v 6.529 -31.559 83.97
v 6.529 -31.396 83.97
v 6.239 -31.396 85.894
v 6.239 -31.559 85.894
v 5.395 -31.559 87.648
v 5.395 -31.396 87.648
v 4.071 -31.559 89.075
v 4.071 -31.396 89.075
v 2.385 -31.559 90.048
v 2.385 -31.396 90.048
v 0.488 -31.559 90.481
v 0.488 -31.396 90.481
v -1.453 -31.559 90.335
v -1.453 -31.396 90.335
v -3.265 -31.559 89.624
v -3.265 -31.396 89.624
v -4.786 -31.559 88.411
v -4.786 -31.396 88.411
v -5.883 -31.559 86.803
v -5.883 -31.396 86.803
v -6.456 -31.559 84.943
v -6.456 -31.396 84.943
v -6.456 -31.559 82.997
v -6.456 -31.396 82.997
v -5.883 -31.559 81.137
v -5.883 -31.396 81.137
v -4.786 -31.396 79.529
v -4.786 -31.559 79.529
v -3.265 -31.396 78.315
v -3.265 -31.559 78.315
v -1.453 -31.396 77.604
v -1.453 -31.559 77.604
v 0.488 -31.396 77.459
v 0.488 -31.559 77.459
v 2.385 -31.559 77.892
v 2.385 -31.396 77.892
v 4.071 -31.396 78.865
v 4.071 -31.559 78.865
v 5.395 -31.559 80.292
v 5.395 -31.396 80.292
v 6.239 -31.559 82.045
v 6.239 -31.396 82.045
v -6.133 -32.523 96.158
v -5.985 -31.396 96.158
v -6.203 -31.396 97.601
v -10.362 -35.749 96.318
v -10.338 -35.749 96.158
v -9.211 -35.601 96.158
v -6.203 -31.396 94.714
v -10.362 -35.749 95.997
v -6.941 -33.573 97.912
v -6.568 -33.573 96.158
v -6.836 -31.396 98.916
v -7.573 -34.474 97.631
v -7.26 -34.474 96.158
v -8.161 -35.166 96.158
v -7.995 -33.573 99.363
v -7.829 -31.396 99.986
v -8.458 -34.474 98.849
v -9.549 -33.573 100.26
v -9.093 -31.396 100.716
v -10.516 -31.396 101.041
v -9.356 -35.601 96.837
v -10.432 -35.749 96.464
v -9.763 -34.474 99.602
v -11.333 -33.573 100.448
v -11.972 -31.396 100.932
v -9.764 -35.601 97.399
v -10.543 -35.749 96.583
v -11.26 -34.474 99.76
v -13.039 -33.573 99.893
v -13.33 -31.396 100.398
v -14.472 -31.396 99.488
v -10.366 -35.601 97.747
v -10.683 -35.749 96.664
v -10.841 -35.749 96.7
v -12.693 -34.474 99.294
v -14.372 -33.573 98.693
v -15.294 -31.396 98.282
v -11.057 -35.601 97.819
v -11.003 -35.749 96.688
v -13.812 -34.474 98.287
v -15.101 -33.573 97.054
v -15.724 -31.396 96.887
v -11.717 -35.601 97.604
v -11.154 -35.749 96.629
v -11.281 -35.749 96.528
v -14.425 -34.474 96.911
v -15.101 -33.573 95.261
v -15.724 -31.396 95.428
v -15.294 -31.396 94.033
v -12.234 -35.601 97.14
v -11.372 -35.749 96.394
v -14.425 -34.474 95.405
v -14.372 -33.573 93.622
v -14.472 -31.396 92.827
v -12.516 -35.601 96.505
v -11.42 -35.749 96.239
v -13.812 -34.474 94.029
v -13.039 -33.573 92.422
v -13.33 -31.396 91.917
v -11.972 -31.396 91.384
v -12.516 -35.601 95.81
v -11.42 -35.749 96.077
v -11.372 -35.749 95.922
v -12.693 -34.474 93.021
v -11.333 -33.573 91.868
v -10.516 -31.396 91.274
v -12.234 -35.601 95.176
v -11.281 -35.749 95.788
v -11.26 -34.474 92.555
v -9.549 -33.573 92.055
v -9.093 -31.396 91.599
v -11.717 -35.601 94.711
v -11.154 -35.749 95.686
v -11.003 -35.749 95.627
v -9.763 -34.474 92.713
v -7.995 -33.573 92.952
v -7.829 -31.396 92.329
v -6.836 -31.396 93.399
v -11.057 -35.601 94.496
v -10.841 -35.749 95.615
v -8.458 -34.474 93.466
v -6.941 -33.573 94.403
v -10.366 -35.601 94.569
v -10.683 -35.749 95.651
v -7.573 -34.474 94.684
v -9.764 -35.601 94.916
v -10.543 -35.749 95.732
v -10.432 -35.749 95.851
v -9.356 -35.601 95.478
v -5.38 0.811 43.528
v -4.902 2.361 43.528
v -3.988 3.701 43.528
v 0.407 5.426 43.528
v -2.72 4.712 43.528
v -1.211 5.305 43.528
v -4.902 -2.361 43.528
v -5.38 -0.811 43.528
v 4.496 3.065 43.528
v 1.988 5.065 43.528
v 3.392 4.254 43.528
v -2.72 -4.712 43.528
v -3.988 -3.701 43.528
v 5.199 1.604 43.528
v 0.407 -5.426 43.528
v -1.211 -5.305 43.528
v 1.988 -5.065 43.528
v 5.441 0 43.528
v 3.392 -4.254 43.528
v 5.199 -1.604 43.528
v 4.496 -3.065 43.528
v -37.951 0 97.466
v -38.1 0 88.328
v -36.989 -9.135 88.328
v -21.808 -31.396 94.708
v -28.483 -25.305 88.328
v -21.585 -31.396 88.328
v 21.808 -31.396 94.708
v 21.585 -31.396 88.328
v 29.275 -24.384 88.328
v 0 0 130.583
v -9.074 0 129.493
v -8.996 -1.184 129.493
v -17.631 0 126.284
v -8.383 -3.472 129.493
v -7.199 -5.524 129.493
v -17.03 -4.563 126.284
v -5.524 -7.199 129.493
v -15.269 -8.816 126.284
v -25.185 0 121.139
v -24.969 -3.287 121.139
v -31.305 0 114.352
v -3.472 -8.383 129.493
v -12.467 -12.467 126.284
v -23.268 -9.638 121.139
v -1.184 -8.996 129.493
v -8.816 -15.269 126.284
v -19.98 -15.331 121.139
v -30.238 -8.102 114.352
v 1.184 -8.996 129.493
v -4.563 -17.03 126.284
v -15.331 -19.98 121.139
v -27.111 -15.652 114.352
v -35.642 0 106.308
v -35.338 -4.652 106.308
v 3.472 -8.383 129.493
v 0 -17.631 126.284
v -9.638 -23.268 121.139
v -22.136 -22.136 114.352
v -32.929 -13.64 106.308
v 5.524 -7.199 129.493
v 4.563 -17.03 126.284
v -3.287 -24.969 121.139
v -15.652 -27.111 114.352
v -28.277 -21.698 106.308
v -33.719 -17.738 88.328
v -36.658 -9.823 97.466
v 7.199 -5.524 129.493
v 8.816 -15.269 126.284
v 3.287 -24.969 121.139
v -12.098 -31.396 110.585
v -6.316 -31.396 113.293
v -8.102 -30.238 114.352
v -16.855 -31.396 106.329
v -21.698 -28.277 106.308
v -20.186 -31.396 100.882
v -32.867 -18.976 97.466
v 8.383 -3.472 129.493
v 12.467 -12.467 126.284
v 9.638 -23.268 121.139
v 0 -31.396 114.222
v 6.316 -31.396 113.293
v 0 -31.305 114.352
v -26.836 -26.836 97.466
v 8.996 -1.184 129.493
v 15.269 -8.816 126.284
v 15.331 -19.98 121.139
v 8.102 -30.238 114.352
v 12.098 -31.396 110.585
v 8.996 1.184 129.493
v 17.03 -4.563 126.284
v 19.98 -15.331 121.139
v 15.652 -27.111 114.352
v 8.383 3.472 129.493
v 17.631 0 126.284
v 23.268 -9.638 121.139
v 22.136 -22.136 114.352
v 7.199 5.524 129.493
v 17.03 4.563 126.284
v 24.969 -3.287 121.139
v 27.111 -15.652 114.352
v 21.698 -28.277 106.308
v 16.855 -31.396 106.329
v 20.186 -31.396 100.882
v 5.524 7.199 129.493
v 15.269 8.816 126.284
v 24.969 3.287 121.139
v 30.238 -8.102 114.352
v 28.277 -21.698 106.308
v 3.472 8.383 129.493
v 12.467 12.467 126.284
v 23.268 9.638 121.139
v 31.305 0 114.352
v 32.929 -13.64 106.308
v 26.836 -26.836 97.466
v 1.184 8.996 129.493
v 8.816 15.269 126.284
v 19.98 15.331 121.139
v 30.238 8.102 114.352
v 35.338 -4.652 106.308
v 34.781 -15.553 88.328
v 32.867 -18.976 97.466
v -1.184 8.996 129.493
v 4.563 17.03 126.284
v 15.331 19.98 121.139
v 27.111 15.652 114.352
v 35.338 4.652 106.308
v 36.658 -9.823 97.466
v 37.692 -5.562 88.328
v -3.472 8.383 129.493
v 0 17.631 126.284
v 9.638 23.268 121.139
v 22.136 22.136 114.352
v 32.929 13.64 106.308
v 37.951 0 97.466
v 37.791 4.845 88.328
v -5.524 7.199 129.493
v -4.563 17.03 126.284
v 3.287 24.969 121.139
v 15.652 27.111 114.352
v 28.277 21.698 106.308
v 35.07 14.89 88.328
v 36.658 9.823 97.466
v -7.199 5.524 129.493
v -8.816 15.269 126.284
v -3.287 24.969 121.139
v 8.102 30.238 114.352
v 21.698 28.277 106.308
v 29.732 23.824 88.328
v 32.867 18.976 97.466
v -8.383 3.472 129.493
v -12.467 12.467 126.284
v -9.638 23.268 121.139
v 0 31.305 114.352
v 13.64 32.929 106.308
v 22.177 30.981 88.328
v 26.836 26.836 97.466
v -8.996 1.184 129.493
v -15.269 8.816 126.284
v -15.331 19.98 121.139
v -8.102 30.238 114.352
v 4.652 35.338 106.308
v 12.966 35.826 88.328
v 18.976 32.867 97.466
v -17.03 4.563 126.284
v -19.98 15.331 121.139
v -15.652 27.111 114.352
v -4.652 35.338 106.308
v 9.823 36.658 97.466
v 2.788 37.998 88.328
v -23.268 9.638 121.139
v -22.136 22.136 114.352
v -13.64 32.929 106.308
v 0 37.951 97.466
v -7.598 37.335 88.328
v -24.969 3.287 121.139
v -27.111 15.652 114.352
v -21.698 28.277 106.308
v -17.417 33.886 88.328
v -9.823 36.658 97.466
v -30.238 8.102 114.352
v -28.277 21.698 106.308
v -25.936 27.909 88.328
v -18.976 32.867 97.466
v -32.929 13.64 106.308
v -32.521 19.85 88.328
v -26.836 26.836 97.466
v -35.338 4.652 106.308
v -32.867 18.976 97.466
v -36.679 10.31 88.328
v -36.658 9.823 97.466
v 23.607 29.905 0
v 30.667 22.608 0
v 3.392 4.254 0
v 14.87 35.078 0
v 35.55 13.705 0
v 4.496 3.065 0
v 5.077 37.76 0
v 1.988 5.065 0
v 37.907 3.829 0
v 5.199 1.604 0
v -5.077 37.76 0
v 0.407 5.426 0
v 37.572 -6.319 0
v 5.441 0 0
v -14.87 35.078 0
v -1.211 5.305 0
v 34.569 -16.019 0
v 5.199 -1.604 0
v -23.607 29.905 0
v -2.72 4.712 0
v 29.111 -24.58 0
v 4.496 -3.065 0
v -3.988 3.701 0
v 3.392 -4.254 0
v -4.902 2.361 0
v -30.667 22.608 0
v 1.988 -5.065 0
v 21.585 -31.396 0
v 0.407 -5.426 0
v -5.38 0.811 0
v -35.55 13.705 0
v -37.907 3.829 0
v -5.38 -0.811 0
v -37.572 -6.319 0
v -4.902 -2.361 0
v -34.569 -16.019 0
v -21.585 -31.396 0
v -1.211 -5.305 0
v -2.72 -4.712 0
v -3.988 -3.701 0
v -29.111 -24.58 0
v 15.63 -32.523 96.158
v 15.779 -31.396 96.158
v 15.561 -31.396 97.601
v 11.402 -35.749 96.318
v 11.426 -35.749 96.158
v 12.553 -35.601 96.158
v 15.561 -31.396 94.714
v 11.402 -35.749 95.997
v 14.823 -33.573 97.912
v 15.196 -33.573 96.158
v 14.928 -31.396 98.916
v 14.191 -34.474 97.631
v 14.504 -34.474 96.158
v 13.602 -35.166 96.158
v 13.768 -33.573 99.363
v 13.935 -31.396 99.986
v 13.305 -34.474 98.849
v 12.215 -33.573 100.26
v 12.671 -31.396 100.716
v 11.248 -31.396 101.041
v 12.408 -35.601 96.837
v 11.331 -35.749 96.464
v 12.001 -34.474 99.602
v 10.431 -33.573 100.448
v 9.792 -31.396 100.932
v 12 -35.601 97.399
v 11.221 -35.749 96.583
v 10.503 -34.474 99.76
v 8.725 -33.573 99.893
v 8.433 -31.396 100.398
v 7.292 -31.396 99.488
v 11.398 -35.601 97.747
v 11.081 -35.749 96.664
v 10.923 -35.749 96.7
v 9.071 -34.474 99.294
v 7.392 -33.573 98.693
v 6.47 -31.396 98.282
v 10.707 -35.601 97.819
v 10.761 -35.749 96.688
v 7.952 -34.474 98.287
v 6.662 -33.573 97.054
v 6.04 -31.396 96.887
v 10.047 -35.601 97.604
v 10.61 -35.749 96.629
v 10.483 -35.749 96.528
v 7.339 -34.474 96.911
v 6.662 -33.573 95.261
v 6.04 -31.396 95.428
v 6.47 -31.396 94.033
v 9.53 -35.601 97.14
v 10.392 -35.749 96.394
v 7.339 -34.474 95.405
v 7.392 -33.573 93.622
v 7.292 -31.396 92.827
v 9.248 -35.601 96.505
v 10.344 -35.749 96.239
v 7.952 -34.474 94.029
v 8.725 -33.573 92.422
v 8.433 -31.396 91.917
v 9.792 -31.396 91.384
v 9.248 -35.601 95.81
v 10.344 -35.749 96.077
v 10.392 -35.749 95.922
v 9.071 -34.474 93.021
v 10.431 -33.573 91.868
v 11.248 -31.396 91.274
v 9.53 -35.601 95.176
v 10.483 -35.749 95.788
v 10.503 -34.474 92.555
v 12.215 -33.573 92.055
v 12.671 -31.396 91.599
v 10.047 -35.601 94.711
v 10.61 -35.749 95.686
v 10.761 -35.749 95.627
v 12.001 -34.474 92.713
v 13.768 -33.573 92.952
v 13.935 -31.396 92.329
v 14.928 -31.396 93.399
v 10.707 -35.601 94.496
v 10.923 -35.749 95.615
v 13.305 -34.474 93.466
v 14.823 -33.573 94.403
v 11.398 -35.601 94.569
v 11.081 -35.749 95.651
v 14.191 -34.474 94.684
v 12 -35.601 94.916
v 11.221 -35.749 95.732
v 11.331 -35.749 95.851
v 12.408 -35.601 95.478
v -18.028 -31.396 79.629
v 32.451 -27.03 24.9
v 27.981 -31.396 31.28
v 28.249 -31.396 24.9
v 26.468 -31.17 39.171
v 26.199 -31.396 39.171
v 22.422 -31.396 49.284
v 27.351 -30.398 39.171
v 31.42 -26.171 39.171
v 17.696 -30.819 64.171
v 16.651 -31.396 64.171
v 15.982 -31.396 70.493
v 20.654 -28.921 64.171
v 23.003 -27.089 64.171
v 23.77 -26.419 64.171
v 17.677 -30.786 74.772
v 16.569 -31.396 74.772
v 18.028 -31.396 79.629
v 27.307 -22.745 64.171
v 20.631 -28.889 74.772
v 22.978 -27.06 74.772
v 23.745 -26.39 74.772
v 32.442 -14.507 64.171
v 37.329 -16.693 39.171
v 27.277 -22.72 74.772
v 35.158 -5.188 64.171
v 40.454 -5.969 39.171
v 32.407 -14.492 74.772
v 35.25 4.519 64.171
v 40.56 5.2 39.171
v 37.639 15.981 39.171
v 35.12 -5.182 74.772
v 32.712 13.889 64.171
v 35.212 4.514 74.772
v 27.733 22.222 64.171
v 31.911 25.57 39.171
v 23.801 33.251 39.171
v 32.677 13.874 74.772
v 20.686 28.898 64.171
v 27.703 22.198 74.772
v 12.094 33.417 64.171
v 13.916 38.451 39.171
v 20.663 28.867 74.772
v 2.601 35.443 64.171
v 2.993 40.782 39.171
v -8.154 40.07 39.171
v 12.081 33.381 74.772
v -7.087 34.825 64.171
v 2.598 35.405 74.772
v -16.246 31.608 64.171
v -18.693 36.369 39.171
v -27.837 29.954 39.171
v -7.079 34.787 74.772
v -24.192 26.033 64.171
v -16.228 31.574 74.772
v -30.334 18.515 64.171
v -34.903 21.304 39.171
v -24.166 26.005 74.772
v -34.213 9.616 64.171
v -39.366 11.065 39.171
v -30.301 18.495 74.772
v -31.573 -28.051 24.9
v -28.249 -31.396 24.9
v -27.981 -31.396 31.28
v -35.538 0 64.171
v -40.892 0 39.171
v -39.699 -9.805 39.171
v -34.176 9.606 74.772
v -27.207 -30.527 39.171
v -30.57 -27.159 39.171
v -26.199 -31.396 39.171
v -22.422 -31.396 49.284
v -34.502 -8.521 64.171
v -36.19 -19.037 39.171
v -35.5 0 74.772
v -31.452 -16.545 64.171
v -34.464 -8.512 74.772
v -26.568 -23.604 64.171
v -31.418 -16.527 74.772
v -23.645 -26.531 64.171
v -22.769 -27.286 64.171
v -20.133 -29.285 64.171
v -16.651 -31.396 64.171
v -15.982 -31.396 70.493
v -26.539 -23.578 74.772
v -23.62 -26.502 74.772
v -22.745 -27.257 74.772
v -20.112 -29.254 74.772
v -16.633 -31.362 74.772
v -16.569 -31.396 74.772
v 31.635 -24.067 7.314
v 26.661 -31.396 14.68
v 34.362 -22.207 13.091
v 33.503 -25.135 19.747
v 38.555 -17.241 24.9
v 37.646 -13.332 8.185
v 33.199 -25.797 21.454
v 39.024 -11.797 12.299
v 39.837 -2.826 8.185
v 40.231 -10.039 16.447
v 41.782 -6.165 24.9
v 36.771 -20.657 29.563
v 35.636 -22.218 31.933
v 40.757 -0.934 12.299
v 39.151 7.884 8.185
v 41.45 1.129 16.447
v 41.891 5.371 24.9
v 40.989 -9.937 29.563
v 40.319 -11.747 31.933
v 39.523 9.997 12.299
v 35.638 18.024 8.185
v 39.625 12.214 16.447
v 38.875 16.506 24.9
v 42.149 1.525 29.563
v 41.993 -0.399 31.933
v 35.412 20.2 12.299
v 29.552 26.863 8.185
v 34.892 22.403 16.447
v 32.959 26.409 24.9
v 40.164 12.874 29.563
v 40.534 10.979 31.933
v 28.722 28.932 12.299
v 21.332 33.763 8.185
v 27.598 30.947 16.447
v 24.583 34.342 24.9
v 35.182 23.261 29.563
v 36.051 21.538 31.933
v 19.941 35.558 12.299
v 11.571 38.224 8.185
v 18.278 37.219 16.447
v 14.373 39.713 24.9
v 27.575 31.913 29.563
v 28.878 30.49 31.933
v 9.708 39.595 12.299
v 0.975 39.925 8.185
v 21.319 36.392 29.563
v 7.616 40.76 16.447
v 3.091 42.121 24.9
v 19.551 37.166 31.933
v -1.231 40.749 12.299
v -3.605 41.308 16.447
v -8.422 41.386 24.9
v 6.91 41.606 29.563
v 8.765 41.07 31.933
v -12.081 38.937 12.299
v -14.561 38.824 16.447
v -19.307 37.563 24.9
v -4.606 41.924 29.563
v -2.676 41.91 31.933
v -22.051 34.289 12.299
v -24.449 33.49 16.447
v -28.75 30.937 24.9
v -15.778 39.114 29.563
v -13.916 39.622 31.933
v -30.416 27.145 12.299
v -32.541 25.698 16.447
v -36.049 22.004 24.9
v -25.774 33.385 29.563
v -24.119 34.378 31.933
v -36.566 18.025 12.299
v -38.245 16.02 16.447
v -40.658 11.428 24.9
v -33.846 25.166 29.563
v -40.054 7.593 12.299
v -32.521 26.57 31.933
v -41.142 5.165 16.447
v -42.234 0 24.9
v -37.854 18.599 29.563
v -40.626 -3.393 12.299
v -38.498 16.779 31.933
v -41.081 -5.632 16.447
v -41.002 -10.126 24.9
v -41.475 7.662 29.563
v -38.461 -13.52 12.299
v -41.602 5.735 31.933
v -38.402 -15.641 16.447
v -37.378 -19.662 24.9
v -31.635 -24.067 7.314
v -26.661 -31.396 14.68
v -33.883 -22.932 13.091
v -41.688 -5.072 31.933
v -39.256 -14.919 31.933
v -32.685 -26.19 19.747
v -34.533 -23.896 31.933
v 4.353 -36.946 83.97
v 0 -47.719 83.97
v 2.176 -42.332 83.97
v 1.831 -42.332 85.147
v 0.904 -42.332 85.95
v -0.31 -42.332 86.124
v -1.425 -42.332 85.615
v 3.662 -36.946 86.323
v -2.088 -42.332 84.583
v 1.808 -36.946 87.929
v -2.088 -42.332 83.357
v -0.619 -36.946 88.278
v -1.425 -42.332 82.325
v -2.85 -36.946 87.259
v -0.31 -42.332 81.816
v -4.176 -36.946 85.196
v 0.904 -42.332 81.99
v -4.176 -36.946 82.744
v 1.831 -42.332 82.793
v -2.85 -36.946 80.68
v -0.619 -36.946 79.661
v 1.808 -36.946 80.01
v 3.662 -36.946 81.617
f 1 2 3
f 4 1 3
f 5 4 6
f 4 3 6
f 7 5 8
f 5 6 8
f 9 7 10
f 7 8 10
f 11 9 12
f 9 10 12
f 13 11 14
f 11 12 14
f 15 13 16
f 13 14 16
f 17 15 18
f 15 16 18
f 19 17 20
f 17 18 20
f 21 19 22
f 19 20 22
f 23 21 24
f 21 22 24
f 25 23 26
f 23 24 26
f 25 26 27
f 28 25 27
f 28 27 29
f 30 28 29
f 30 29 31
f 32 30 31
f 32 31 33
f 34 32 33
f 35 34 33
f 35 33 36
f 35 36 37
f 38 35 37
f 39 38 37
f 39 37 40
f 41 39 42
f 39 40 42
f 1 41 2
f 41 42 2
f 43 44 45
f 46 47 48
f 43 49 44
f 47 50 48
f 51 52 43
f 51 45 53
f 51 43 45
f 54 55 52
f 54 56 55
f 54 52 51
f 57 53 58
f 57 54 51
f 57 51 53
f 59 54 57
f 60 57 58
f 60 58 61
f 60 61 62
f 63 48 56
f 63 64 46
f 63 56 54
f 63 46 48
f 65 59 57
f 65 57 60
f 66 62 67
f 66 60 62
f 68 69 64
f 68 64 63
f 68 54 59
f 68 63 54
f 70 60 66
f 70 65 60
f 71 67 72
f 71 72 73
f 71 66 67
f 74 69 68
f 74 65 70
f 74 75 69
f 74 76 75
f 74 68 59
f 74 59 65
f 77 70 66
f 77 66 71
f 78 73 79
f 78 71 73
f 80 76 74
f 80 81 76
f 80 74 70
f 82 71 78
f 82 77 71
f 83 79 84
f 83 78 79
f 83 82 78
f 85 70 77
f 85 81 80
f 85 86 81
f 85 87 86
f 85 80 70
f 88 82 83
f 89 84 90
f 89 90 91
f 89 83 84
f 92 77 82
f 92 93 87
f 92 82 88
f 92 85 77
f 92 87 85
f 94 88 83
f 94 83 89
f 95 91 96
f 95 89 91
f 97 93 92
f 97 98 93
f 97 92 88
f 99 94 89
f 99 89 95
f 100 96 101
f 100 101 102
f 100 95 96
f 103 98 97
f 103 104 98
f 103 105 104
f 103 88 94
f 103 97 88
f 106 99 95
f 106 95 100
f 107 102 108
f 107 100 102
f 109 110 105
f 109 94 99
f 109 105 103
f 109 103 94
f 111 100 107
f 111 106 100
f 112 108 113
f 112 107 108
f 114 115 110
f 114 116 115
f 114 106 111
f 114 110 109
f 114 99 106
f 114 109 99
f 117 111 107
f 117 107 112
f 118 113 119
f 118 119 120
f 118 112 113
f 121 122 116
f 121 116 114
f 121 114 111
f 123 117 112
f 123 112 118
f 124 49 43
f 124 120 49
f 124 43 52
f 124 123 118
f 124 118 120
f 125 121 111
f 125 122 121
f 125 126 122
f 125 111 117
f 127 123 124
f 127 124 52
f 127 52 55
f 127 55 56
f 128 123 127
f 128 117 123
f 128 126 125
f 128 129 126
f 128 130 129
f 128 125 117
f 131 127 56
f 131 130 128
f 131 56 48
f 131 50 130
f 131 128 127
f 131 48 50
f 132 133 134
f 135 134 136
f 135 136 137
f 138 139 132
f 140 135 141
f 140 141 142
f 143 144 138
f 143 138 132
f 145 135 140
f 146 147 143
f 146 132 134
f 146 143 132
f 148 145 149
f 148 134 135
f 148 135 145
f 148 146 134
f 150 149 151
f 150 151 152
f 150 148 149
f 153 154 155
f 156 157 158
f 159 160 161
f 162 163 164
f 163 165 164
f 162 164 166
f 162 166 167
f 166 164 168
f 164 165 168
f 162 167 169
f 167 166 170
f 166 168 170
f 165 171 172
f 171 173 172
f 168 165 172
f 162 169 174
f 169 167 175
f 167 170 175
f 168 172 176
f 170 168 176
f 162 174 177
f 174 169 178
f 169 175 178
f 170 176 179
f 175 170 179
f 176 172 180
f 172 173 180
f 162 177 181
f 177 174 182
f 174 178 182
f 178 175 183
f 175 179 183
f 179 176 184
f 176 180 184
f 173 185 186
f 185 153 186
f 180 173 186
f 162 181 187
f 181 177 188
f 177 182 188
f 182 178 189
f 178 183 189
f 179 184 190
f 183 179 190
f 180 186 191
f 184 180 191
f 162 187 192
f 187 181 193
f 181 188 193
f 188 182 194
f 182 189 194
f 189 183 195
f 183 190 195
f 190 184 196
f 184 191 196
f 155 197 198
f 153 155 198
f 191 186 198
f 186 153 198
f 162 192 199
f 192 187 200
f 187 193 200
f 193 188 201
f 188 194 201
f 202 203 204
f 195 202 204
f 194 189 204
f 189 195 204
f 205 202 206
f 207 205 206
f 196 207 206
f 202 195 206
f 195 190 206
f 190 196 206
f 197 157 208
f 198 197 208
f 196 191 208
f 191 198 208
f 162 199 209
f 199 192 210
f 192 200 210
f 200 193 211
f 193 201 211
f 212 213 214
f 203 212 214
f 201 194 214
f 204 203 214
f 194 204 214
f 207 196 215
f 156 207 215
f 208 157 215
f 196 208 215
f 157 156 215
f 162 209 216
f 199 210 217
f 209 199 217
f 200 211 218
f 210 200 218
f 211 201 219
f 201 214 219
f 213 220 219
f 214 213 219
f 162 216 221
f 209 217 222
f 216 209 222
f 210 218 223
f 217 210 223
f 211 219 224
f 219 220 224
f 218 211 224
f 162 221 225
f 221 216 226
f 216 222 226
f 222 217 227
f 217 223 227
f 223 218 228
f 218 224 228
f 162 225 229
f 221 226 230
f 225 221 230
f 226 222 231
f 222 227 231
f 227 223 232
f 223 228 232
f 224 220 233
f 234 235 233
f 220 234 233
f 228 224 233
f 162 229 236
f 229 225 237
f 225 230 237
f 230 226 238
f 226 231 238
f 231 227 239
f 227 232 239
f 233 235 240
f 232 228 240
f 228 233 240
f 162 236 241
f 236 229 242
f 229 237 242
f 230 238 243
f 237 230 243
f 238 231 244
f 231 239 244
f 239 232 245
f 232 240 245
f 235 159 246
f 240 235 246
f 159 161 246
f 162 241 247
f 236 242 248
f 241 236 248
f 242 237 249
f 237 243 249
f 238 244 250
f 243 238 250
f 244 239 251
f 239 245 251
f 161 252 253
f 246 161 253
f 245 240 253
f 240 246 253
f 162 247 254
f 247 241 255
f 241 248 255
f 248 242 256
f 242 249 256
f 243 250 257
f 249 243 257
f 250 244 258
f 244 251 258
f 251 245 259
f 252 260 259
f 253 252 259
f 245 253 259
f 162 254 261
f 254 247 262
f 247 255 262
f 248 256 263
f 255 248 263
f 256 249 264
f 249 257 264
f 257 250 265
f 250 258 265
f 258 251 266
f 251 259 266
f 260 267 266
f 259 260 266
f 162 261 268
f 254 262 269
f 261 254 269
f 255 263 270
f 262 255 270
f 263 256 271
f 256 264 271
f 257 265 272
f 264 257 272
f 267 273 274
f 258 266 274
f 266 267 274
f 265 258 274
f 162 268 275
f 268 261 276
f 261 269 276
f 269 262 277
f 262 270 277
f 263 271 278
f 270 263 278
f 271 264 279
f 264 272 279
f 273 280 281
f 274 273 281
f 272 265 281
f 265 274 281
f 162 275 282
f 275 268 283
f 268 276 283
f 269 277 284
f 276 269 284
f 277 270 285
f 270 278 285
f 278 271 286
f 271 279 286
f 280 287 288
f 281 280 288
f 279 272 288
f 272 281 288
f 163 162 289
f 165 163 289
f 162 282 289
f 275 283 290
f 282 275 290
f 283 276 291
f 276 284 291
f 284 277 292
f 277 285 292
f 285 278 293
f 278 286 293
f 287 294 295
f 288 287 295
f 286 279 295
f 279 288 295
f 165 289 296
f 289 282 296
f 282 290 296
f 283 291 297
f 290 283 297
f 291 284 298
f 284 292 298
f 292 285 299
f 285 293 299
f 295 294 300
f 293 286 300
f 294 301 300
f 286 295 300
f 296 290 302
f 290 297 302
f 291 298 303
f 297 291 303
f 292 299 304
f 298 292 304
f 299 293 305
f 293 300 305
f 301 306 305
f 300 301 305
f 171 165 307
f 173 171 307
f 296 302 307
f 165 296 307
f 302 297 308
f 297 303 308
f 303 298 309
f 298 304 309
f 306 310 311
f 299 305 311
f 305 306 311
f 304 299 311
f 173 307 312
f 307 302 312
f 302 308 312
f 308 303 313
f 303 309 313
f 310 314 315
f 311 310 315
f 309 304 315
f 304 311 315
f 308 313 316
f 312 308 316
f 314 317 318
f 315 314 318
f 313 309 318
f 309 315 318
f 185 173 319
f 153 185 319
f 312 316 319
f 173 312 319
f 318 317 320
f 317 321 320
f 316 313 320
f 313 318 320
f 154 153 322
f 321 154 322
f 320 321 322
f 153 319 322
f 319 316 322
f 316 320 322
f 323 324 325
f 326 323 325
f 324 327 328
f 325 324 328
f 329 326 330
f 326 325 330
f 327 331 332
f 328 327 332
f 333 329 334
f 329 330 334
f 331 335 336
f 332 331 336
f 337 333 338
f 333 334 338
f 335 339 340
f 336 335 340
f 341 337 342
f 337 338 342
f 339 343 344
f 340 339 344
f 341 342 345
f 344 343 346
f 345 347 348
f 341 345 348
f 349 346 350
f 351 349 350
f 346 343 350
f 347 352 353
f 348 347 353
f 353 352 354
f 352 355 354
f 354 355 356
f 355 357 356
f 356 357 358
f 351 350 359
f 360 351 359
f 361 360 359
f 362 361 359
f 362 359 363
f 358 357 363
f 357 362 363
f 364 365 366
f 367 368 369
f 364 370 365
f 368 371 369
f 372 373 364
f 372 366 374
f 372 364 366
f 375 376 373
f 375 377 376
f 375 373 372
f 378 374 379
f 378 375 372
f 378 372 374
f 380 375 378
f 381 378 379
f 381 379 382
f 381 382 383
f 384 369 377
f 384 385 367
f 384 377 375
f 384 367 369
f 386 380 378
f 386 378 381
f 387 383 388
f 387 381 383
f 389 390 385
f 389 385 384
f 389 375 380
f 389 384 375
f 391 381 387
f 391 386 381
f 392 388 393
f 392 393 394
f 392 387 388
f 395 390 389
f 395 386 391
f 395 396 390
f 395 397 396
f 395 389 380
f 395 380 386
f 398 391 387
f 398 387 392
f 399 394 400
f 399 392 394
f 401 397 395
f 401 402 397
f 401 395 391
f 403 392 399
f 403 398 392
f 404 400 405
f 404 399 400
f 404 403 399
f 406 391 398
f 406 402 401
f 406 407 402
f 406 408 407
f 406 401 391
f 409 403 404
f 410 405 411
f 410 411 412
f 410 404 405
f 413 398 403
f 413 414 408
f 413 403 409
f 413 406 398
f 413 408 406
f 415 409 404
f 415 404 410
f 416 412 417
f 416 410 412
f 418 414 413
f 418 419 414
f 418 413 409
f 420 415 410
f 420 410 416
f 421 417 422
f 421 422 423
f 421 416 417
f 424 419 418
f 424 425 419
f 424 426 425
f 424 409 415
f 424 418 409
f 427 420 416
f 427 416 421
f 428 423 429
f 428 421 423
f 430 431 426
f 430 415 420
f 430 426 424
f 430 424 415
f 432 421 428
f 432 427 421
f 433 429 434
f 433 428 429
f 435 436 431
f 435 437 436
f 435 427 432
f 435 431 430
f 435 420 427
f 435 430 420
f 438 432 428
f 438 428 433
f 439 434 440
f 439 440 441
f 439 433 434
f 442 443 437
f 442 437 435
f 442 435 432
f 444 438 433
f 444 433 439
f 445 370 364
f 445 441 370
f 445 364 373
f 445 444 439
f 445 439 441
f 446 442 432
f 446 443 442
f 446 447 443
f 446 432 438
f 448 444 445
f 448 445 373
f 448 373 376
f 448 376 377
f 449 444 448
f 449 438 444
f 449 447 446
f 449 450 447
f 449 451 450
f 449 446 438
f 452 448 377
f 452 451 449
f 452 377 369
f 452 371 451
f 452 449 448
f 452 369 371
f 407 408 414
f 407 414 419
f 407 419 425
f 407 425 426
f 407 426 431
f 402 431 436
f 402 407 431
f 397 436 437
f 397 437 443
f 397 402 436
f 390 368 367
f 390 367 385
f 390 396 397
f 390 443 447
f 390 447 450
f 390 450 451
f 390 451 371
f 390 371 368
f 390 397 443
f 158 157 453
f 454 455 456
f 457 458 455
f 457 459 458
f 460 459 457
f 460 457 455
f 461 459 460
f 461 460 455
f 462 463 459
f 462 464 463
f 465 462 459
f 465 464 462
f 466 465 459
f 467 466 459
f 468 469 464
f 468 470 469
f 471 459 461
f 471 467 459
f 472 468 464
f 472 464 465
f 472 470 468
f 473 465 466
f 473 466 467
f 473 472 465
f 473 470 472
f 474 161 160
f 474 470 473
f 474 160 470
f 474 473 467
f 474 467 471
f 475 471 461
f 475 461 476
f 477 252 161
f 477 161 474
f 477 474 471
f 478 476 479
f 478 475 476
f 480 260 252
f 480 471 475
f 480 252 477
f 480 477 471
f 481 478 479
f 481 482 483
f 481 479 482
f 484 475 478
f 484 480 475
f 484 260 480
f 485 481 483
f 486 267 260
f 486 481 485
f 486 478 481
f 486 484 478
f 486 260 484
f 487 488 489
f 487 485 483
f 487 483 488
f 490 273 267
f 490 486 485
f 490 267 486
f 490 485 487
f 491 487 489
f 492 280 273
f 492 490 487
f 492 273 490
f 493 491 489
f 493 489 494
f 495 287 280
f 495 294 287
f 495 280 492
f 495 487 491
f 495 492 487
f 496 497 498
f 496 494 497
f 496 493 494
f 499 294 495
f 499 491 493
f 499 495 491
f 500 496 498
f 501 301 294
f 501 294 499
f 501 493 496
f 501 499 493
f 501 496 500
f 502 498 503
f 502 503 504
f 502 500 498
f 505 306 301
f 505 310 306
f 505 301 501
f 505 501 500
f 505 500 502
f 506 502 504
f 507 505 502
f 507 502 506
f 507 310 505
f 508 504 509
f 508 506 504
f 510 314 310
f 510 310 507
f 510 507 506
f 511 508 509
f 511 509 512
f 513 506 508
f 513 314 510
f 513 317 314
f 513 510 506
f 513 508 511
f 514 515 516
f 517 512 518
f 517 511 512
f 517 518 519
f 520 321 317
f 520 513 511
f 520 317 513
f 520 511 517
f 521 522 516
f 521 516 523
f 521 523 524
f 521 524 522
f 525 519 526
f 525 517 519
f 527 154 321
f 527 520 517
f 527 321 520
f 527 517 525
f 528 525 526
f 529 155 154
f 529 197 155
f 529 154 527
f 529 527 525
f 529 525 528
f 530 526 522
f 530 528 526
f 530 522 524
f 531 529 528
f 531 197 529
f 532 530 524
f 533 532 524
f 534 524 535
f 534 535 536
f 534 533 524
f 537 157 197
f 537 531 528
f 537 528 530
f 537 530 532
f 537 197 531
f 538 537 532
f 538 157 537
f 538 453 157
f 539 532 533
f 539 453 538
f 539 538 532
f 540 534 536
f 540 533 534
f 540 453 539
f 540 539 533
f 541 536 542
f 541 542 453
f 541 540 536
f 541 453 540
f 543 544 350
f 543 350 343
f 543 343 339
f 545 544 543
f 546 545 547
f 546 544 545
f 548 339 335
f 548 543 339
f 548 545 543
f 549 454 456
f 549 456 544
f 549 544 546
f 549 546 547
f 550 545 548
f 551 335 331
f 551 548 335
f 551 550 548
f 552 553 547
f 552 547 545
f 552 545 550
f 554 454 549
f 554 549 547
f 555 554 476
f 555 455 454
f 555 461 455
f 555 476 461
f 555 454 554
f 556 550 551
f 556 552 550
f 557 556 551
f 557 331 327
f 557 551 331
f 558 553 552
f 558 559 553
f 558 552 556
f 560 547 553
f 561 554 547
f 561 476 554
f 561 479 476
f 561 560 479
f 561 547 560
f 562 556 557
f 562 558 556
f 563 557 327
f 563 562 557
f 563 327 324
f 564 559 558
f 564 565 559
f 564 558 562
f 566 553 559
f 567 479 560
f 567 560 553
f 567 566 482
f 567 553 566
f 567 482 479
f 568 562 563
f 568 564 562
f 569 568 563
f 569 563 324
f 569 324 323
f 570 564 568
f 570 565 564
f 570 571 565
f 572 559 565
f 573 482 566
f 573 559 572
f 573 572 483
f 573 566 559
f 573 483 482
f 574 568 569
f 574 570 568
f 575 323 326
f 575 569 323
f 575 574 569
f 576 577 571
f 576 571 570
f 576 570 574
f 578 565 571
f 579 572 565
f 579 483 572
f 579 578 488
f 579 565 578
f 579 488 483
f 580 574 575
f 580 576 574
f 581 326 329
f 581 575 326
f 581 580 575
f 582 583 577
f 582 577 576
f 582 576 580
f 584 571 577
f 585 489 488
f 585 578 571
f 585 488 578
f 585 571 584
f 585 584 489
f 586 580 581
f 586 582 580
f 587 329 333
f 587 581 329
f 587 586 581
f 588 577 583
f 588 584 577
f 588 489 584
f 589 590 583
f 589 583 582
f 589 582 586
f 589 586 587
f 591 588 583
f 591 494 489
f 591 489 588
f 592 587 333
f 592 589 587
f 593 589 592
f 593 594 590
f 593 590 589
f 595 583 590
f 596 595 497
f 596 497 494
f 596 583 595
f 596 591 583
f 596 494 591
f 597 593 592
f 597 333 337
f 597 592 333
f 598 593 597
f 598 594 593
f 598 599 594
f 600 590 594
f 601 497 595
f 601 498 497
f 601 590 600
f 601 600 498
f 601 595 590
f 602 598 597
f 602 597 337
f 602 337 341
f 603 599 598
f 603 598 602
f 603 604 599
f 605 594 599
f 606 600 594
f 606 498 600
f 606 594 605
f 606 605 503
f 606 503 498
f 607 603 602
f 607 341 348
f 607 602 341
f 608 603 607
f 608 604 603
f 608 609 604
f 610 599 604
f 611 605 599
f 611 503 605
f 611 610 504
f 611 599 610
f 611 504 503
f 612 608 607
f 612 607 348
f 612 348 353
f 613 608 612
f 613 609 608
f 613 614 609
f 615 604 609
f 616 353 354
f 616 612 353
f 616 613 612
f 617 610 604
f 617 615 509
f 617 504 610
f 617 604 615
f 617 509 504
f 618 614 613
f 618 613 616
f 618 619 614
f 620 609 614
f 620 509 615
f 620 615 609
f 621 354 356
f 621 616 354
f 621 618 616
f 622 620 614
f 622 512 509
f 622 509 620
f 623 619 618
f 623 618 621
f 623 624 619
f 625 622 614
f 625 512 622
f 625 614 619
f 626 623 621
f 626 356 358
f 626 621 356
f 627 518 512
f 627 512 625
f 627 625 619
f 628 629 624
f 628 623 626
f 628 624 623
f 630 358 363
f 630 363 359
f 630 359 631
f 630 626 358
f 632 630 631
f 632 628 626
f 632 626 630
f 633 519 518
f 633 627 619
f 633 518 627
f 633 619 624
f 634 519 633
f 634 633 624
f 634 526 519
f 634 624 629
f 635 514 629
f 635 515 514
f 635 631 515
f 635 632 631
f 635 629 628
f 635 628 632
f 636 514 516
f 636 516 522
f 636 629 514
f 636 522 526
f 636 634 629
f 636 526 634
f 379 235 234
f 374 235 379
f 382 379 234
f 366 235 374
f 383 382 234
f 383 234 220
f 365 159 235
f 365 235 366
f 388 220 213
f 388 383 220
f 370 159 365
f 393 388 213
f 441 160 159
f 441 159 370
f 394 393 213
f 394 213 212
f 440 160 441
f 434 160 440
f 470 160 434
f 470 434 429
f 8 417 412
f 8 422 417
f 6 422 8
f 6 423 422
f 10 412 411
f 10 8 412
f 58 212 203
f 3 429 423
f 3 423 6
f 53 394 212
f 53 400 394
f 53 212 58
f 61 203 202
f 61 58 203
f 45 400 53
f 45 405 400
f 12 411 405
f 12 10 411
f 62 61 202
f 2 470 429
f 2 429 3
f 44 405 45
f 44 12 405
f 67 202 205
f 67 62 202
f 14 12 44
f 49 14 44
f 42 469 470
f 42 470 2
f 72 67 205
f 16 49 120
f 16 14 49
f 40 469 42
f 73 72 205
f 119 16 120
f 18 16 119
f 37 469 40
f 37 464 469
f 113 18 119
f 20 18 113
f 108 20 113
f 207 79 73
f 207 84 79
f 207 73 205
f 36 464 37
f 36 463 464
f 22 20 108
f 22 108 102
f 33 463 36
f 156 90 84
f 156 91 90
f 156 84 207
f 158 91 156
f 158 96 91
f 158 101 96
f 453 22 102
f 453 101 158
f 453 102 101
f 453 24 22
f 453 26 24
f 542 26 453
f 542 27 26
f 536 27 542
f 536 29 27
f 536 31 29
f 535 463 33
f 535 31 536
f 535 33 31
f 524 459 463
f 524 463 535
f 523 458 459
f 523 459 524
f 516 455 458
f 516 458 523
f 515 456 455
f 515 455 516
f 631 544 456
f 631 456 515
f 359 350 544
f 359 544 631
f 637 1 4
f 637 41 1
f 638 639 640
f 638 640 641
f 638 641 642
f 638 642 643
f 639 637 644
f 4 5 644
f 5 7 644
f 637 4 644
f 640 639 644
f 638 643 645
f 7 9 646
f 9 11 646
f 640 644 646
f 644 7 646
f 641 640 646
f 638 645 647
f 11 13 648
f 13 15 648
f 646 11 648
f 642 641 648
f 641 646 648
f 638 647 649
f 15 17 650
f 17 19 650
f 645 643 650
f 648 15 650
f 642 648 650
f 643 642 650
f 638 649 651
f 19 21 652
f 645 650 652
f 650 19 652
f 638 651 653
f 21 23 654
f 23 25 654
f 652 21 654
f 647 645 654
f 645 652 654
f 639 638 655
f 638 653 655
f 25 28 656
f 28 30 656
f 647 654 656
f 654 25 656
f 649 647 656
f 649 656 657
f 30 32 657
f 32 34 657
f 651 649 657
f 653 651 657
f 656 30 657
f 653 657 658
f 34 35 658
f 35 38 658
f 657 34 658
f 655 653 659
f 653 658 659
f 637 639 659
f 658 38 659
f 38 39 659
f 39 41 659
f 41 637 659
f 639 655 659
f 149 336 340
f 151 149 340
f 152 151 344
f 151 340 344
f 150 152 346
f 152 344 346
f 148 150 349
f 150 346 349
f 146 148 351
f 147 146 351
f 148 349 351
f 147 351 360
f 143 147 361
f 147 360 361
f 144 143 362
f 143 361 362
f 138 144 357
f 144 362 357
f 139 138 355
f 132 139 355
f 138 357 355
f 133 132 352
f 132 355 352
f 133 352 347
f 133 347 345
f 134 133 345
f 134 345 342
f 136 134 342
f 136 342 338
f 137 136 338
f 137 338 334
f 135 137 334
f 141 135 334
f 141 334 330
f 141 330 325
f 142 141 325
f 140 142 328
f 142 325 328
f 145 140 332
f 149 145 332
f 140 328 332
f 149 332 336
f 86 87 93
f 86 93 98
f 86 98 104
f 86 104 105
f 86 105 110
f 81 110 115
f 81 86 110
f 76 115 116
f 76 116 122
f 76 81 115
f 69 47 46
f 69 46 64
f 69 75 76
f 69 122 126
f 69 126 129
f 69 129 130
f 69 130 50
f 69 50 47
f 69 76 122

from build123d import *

# Parameters (mm, degrees)
F3_DEPTH  = 177.8
F4_R      = 7.62
F5_DEPTH  = 19.05
F6_SIZE2  = 18.860161823
F6_SIZE   = 7.62
F4_R_2    = 5.715
F7_DEPTH  = 5.08
F8_R      = 5.07999
F9_R      = 6.35
F10_DEPTH = 50.8
F11_SCALE = 0.85684223


# Not quite as in the source:
# - a fillet or chamfer is up to 0.001 mm smaller than in the source, because OpenCascade refuses the exact size


with BuildPart() as f1:
    # F0 (on Front) → F1 (revolve)
    with BuildSketch(Plane.XZ):
        with BuildLine():
            Line((-38.2711647941, 0), (0, 0))
            Line((0, 0), (0, 146.0500033258))
            Line((0, 146.0500033258), (0, 152.4))
            ThreePointArc((0, 152.4), (-33.2006597867, 137.6319951518), (-44.4655865431, 103.0852268133))
            add(Edge.make_bspline(
                [(-44.4655865431, 0), (-47.1114422222, 11.762074058), (-53.3469479224, 35.8297600734), (-37.8272166921, 76.0482431769), (-42.543614325, 94.8604386904), (-44.4655865431, 103.0852268133)],
                knots=[0, 0, 0, 0, 0.3424224234, 0.7066775859, 1, 1, 1, 1], degree=3))
            Line((-44.4655865431, 0), (-38.2711647941, 0))
        make_face()
    revolve(axis=Axis((0, 0, 76.2), (0, 0, 1)))

    # F2 (on Top) → F3 (cut)
    with BuildSketch(Plane.XY):
        Polygon((25.6092443837, -36.641700535), (-25.1907556163, -36.641700535), (-46.7807556163, -36.641700535), (-46.7807556163, -67.121700535), (42.1192443837, -67.121700535), (42.1192443837, -36.641700535), align=None)
    extrude(amount=F3_DEPTH, mode=Mode.SUBTRACT)

    # F4 (on face) → F5 (join)
    with BuildSketch(Plane.XZ.offset(36.641700535)):
        with Locations((0, 97.9992443837)):
            Circle(F4_R)
    extrude(amount=F5_DEPTH)

    # F6
    f6_edges = [f1.edges().sort_by_distance(p)[0] for p in [
        (-7.62, -55.691701, 97.999244),
    ]]
    f6_side = f1.faces().sort_by_distance((0, -55.691701, 97.999244))[0]
    chamfer(f6_edges, length=F6_SIZE, length2=F6_SIZE2, reference=f6_side)

    # F4 (on face) → F7 (join)
    with BuildSketch(Plane.XZ.offset(36.641700535)):
        with Locations((-12.7, 112.2232443837)):
            Circle(F4_R_2)
        with Locations((12.7, 112.2232443837)):
            Circle(F4_R_2)
    extrude(amount=F7_DEPTH)

    # F8 (radius 5.08 in the source; OpenCascade refuses exactly that, so slightly less here)
    f8_edges = [f1.edges().sort_by_distance(p)[0] for p in [
        (-18.415, -41.721701, 112.223244),
        (6.985, -41.721701, 112.223244),
    ]]
    fillet(f8_edges, radius=F8_R)

    # F9 (on face) → F10 (cut)
    with BuildSketch(Plane(origin=(0, 0, 0), x_dir=(1, 0, 0), z_dir=(0, 0, -1))):
        Circle(F9_R)
    extrude(amount=-F10_DEPTH, mode=Mode.SUBTRACT)


with BuildPart() as f1_1:
    # F11: moved
    add(f1.part.scale(F11_SCALE))


solid = f1_1.part
